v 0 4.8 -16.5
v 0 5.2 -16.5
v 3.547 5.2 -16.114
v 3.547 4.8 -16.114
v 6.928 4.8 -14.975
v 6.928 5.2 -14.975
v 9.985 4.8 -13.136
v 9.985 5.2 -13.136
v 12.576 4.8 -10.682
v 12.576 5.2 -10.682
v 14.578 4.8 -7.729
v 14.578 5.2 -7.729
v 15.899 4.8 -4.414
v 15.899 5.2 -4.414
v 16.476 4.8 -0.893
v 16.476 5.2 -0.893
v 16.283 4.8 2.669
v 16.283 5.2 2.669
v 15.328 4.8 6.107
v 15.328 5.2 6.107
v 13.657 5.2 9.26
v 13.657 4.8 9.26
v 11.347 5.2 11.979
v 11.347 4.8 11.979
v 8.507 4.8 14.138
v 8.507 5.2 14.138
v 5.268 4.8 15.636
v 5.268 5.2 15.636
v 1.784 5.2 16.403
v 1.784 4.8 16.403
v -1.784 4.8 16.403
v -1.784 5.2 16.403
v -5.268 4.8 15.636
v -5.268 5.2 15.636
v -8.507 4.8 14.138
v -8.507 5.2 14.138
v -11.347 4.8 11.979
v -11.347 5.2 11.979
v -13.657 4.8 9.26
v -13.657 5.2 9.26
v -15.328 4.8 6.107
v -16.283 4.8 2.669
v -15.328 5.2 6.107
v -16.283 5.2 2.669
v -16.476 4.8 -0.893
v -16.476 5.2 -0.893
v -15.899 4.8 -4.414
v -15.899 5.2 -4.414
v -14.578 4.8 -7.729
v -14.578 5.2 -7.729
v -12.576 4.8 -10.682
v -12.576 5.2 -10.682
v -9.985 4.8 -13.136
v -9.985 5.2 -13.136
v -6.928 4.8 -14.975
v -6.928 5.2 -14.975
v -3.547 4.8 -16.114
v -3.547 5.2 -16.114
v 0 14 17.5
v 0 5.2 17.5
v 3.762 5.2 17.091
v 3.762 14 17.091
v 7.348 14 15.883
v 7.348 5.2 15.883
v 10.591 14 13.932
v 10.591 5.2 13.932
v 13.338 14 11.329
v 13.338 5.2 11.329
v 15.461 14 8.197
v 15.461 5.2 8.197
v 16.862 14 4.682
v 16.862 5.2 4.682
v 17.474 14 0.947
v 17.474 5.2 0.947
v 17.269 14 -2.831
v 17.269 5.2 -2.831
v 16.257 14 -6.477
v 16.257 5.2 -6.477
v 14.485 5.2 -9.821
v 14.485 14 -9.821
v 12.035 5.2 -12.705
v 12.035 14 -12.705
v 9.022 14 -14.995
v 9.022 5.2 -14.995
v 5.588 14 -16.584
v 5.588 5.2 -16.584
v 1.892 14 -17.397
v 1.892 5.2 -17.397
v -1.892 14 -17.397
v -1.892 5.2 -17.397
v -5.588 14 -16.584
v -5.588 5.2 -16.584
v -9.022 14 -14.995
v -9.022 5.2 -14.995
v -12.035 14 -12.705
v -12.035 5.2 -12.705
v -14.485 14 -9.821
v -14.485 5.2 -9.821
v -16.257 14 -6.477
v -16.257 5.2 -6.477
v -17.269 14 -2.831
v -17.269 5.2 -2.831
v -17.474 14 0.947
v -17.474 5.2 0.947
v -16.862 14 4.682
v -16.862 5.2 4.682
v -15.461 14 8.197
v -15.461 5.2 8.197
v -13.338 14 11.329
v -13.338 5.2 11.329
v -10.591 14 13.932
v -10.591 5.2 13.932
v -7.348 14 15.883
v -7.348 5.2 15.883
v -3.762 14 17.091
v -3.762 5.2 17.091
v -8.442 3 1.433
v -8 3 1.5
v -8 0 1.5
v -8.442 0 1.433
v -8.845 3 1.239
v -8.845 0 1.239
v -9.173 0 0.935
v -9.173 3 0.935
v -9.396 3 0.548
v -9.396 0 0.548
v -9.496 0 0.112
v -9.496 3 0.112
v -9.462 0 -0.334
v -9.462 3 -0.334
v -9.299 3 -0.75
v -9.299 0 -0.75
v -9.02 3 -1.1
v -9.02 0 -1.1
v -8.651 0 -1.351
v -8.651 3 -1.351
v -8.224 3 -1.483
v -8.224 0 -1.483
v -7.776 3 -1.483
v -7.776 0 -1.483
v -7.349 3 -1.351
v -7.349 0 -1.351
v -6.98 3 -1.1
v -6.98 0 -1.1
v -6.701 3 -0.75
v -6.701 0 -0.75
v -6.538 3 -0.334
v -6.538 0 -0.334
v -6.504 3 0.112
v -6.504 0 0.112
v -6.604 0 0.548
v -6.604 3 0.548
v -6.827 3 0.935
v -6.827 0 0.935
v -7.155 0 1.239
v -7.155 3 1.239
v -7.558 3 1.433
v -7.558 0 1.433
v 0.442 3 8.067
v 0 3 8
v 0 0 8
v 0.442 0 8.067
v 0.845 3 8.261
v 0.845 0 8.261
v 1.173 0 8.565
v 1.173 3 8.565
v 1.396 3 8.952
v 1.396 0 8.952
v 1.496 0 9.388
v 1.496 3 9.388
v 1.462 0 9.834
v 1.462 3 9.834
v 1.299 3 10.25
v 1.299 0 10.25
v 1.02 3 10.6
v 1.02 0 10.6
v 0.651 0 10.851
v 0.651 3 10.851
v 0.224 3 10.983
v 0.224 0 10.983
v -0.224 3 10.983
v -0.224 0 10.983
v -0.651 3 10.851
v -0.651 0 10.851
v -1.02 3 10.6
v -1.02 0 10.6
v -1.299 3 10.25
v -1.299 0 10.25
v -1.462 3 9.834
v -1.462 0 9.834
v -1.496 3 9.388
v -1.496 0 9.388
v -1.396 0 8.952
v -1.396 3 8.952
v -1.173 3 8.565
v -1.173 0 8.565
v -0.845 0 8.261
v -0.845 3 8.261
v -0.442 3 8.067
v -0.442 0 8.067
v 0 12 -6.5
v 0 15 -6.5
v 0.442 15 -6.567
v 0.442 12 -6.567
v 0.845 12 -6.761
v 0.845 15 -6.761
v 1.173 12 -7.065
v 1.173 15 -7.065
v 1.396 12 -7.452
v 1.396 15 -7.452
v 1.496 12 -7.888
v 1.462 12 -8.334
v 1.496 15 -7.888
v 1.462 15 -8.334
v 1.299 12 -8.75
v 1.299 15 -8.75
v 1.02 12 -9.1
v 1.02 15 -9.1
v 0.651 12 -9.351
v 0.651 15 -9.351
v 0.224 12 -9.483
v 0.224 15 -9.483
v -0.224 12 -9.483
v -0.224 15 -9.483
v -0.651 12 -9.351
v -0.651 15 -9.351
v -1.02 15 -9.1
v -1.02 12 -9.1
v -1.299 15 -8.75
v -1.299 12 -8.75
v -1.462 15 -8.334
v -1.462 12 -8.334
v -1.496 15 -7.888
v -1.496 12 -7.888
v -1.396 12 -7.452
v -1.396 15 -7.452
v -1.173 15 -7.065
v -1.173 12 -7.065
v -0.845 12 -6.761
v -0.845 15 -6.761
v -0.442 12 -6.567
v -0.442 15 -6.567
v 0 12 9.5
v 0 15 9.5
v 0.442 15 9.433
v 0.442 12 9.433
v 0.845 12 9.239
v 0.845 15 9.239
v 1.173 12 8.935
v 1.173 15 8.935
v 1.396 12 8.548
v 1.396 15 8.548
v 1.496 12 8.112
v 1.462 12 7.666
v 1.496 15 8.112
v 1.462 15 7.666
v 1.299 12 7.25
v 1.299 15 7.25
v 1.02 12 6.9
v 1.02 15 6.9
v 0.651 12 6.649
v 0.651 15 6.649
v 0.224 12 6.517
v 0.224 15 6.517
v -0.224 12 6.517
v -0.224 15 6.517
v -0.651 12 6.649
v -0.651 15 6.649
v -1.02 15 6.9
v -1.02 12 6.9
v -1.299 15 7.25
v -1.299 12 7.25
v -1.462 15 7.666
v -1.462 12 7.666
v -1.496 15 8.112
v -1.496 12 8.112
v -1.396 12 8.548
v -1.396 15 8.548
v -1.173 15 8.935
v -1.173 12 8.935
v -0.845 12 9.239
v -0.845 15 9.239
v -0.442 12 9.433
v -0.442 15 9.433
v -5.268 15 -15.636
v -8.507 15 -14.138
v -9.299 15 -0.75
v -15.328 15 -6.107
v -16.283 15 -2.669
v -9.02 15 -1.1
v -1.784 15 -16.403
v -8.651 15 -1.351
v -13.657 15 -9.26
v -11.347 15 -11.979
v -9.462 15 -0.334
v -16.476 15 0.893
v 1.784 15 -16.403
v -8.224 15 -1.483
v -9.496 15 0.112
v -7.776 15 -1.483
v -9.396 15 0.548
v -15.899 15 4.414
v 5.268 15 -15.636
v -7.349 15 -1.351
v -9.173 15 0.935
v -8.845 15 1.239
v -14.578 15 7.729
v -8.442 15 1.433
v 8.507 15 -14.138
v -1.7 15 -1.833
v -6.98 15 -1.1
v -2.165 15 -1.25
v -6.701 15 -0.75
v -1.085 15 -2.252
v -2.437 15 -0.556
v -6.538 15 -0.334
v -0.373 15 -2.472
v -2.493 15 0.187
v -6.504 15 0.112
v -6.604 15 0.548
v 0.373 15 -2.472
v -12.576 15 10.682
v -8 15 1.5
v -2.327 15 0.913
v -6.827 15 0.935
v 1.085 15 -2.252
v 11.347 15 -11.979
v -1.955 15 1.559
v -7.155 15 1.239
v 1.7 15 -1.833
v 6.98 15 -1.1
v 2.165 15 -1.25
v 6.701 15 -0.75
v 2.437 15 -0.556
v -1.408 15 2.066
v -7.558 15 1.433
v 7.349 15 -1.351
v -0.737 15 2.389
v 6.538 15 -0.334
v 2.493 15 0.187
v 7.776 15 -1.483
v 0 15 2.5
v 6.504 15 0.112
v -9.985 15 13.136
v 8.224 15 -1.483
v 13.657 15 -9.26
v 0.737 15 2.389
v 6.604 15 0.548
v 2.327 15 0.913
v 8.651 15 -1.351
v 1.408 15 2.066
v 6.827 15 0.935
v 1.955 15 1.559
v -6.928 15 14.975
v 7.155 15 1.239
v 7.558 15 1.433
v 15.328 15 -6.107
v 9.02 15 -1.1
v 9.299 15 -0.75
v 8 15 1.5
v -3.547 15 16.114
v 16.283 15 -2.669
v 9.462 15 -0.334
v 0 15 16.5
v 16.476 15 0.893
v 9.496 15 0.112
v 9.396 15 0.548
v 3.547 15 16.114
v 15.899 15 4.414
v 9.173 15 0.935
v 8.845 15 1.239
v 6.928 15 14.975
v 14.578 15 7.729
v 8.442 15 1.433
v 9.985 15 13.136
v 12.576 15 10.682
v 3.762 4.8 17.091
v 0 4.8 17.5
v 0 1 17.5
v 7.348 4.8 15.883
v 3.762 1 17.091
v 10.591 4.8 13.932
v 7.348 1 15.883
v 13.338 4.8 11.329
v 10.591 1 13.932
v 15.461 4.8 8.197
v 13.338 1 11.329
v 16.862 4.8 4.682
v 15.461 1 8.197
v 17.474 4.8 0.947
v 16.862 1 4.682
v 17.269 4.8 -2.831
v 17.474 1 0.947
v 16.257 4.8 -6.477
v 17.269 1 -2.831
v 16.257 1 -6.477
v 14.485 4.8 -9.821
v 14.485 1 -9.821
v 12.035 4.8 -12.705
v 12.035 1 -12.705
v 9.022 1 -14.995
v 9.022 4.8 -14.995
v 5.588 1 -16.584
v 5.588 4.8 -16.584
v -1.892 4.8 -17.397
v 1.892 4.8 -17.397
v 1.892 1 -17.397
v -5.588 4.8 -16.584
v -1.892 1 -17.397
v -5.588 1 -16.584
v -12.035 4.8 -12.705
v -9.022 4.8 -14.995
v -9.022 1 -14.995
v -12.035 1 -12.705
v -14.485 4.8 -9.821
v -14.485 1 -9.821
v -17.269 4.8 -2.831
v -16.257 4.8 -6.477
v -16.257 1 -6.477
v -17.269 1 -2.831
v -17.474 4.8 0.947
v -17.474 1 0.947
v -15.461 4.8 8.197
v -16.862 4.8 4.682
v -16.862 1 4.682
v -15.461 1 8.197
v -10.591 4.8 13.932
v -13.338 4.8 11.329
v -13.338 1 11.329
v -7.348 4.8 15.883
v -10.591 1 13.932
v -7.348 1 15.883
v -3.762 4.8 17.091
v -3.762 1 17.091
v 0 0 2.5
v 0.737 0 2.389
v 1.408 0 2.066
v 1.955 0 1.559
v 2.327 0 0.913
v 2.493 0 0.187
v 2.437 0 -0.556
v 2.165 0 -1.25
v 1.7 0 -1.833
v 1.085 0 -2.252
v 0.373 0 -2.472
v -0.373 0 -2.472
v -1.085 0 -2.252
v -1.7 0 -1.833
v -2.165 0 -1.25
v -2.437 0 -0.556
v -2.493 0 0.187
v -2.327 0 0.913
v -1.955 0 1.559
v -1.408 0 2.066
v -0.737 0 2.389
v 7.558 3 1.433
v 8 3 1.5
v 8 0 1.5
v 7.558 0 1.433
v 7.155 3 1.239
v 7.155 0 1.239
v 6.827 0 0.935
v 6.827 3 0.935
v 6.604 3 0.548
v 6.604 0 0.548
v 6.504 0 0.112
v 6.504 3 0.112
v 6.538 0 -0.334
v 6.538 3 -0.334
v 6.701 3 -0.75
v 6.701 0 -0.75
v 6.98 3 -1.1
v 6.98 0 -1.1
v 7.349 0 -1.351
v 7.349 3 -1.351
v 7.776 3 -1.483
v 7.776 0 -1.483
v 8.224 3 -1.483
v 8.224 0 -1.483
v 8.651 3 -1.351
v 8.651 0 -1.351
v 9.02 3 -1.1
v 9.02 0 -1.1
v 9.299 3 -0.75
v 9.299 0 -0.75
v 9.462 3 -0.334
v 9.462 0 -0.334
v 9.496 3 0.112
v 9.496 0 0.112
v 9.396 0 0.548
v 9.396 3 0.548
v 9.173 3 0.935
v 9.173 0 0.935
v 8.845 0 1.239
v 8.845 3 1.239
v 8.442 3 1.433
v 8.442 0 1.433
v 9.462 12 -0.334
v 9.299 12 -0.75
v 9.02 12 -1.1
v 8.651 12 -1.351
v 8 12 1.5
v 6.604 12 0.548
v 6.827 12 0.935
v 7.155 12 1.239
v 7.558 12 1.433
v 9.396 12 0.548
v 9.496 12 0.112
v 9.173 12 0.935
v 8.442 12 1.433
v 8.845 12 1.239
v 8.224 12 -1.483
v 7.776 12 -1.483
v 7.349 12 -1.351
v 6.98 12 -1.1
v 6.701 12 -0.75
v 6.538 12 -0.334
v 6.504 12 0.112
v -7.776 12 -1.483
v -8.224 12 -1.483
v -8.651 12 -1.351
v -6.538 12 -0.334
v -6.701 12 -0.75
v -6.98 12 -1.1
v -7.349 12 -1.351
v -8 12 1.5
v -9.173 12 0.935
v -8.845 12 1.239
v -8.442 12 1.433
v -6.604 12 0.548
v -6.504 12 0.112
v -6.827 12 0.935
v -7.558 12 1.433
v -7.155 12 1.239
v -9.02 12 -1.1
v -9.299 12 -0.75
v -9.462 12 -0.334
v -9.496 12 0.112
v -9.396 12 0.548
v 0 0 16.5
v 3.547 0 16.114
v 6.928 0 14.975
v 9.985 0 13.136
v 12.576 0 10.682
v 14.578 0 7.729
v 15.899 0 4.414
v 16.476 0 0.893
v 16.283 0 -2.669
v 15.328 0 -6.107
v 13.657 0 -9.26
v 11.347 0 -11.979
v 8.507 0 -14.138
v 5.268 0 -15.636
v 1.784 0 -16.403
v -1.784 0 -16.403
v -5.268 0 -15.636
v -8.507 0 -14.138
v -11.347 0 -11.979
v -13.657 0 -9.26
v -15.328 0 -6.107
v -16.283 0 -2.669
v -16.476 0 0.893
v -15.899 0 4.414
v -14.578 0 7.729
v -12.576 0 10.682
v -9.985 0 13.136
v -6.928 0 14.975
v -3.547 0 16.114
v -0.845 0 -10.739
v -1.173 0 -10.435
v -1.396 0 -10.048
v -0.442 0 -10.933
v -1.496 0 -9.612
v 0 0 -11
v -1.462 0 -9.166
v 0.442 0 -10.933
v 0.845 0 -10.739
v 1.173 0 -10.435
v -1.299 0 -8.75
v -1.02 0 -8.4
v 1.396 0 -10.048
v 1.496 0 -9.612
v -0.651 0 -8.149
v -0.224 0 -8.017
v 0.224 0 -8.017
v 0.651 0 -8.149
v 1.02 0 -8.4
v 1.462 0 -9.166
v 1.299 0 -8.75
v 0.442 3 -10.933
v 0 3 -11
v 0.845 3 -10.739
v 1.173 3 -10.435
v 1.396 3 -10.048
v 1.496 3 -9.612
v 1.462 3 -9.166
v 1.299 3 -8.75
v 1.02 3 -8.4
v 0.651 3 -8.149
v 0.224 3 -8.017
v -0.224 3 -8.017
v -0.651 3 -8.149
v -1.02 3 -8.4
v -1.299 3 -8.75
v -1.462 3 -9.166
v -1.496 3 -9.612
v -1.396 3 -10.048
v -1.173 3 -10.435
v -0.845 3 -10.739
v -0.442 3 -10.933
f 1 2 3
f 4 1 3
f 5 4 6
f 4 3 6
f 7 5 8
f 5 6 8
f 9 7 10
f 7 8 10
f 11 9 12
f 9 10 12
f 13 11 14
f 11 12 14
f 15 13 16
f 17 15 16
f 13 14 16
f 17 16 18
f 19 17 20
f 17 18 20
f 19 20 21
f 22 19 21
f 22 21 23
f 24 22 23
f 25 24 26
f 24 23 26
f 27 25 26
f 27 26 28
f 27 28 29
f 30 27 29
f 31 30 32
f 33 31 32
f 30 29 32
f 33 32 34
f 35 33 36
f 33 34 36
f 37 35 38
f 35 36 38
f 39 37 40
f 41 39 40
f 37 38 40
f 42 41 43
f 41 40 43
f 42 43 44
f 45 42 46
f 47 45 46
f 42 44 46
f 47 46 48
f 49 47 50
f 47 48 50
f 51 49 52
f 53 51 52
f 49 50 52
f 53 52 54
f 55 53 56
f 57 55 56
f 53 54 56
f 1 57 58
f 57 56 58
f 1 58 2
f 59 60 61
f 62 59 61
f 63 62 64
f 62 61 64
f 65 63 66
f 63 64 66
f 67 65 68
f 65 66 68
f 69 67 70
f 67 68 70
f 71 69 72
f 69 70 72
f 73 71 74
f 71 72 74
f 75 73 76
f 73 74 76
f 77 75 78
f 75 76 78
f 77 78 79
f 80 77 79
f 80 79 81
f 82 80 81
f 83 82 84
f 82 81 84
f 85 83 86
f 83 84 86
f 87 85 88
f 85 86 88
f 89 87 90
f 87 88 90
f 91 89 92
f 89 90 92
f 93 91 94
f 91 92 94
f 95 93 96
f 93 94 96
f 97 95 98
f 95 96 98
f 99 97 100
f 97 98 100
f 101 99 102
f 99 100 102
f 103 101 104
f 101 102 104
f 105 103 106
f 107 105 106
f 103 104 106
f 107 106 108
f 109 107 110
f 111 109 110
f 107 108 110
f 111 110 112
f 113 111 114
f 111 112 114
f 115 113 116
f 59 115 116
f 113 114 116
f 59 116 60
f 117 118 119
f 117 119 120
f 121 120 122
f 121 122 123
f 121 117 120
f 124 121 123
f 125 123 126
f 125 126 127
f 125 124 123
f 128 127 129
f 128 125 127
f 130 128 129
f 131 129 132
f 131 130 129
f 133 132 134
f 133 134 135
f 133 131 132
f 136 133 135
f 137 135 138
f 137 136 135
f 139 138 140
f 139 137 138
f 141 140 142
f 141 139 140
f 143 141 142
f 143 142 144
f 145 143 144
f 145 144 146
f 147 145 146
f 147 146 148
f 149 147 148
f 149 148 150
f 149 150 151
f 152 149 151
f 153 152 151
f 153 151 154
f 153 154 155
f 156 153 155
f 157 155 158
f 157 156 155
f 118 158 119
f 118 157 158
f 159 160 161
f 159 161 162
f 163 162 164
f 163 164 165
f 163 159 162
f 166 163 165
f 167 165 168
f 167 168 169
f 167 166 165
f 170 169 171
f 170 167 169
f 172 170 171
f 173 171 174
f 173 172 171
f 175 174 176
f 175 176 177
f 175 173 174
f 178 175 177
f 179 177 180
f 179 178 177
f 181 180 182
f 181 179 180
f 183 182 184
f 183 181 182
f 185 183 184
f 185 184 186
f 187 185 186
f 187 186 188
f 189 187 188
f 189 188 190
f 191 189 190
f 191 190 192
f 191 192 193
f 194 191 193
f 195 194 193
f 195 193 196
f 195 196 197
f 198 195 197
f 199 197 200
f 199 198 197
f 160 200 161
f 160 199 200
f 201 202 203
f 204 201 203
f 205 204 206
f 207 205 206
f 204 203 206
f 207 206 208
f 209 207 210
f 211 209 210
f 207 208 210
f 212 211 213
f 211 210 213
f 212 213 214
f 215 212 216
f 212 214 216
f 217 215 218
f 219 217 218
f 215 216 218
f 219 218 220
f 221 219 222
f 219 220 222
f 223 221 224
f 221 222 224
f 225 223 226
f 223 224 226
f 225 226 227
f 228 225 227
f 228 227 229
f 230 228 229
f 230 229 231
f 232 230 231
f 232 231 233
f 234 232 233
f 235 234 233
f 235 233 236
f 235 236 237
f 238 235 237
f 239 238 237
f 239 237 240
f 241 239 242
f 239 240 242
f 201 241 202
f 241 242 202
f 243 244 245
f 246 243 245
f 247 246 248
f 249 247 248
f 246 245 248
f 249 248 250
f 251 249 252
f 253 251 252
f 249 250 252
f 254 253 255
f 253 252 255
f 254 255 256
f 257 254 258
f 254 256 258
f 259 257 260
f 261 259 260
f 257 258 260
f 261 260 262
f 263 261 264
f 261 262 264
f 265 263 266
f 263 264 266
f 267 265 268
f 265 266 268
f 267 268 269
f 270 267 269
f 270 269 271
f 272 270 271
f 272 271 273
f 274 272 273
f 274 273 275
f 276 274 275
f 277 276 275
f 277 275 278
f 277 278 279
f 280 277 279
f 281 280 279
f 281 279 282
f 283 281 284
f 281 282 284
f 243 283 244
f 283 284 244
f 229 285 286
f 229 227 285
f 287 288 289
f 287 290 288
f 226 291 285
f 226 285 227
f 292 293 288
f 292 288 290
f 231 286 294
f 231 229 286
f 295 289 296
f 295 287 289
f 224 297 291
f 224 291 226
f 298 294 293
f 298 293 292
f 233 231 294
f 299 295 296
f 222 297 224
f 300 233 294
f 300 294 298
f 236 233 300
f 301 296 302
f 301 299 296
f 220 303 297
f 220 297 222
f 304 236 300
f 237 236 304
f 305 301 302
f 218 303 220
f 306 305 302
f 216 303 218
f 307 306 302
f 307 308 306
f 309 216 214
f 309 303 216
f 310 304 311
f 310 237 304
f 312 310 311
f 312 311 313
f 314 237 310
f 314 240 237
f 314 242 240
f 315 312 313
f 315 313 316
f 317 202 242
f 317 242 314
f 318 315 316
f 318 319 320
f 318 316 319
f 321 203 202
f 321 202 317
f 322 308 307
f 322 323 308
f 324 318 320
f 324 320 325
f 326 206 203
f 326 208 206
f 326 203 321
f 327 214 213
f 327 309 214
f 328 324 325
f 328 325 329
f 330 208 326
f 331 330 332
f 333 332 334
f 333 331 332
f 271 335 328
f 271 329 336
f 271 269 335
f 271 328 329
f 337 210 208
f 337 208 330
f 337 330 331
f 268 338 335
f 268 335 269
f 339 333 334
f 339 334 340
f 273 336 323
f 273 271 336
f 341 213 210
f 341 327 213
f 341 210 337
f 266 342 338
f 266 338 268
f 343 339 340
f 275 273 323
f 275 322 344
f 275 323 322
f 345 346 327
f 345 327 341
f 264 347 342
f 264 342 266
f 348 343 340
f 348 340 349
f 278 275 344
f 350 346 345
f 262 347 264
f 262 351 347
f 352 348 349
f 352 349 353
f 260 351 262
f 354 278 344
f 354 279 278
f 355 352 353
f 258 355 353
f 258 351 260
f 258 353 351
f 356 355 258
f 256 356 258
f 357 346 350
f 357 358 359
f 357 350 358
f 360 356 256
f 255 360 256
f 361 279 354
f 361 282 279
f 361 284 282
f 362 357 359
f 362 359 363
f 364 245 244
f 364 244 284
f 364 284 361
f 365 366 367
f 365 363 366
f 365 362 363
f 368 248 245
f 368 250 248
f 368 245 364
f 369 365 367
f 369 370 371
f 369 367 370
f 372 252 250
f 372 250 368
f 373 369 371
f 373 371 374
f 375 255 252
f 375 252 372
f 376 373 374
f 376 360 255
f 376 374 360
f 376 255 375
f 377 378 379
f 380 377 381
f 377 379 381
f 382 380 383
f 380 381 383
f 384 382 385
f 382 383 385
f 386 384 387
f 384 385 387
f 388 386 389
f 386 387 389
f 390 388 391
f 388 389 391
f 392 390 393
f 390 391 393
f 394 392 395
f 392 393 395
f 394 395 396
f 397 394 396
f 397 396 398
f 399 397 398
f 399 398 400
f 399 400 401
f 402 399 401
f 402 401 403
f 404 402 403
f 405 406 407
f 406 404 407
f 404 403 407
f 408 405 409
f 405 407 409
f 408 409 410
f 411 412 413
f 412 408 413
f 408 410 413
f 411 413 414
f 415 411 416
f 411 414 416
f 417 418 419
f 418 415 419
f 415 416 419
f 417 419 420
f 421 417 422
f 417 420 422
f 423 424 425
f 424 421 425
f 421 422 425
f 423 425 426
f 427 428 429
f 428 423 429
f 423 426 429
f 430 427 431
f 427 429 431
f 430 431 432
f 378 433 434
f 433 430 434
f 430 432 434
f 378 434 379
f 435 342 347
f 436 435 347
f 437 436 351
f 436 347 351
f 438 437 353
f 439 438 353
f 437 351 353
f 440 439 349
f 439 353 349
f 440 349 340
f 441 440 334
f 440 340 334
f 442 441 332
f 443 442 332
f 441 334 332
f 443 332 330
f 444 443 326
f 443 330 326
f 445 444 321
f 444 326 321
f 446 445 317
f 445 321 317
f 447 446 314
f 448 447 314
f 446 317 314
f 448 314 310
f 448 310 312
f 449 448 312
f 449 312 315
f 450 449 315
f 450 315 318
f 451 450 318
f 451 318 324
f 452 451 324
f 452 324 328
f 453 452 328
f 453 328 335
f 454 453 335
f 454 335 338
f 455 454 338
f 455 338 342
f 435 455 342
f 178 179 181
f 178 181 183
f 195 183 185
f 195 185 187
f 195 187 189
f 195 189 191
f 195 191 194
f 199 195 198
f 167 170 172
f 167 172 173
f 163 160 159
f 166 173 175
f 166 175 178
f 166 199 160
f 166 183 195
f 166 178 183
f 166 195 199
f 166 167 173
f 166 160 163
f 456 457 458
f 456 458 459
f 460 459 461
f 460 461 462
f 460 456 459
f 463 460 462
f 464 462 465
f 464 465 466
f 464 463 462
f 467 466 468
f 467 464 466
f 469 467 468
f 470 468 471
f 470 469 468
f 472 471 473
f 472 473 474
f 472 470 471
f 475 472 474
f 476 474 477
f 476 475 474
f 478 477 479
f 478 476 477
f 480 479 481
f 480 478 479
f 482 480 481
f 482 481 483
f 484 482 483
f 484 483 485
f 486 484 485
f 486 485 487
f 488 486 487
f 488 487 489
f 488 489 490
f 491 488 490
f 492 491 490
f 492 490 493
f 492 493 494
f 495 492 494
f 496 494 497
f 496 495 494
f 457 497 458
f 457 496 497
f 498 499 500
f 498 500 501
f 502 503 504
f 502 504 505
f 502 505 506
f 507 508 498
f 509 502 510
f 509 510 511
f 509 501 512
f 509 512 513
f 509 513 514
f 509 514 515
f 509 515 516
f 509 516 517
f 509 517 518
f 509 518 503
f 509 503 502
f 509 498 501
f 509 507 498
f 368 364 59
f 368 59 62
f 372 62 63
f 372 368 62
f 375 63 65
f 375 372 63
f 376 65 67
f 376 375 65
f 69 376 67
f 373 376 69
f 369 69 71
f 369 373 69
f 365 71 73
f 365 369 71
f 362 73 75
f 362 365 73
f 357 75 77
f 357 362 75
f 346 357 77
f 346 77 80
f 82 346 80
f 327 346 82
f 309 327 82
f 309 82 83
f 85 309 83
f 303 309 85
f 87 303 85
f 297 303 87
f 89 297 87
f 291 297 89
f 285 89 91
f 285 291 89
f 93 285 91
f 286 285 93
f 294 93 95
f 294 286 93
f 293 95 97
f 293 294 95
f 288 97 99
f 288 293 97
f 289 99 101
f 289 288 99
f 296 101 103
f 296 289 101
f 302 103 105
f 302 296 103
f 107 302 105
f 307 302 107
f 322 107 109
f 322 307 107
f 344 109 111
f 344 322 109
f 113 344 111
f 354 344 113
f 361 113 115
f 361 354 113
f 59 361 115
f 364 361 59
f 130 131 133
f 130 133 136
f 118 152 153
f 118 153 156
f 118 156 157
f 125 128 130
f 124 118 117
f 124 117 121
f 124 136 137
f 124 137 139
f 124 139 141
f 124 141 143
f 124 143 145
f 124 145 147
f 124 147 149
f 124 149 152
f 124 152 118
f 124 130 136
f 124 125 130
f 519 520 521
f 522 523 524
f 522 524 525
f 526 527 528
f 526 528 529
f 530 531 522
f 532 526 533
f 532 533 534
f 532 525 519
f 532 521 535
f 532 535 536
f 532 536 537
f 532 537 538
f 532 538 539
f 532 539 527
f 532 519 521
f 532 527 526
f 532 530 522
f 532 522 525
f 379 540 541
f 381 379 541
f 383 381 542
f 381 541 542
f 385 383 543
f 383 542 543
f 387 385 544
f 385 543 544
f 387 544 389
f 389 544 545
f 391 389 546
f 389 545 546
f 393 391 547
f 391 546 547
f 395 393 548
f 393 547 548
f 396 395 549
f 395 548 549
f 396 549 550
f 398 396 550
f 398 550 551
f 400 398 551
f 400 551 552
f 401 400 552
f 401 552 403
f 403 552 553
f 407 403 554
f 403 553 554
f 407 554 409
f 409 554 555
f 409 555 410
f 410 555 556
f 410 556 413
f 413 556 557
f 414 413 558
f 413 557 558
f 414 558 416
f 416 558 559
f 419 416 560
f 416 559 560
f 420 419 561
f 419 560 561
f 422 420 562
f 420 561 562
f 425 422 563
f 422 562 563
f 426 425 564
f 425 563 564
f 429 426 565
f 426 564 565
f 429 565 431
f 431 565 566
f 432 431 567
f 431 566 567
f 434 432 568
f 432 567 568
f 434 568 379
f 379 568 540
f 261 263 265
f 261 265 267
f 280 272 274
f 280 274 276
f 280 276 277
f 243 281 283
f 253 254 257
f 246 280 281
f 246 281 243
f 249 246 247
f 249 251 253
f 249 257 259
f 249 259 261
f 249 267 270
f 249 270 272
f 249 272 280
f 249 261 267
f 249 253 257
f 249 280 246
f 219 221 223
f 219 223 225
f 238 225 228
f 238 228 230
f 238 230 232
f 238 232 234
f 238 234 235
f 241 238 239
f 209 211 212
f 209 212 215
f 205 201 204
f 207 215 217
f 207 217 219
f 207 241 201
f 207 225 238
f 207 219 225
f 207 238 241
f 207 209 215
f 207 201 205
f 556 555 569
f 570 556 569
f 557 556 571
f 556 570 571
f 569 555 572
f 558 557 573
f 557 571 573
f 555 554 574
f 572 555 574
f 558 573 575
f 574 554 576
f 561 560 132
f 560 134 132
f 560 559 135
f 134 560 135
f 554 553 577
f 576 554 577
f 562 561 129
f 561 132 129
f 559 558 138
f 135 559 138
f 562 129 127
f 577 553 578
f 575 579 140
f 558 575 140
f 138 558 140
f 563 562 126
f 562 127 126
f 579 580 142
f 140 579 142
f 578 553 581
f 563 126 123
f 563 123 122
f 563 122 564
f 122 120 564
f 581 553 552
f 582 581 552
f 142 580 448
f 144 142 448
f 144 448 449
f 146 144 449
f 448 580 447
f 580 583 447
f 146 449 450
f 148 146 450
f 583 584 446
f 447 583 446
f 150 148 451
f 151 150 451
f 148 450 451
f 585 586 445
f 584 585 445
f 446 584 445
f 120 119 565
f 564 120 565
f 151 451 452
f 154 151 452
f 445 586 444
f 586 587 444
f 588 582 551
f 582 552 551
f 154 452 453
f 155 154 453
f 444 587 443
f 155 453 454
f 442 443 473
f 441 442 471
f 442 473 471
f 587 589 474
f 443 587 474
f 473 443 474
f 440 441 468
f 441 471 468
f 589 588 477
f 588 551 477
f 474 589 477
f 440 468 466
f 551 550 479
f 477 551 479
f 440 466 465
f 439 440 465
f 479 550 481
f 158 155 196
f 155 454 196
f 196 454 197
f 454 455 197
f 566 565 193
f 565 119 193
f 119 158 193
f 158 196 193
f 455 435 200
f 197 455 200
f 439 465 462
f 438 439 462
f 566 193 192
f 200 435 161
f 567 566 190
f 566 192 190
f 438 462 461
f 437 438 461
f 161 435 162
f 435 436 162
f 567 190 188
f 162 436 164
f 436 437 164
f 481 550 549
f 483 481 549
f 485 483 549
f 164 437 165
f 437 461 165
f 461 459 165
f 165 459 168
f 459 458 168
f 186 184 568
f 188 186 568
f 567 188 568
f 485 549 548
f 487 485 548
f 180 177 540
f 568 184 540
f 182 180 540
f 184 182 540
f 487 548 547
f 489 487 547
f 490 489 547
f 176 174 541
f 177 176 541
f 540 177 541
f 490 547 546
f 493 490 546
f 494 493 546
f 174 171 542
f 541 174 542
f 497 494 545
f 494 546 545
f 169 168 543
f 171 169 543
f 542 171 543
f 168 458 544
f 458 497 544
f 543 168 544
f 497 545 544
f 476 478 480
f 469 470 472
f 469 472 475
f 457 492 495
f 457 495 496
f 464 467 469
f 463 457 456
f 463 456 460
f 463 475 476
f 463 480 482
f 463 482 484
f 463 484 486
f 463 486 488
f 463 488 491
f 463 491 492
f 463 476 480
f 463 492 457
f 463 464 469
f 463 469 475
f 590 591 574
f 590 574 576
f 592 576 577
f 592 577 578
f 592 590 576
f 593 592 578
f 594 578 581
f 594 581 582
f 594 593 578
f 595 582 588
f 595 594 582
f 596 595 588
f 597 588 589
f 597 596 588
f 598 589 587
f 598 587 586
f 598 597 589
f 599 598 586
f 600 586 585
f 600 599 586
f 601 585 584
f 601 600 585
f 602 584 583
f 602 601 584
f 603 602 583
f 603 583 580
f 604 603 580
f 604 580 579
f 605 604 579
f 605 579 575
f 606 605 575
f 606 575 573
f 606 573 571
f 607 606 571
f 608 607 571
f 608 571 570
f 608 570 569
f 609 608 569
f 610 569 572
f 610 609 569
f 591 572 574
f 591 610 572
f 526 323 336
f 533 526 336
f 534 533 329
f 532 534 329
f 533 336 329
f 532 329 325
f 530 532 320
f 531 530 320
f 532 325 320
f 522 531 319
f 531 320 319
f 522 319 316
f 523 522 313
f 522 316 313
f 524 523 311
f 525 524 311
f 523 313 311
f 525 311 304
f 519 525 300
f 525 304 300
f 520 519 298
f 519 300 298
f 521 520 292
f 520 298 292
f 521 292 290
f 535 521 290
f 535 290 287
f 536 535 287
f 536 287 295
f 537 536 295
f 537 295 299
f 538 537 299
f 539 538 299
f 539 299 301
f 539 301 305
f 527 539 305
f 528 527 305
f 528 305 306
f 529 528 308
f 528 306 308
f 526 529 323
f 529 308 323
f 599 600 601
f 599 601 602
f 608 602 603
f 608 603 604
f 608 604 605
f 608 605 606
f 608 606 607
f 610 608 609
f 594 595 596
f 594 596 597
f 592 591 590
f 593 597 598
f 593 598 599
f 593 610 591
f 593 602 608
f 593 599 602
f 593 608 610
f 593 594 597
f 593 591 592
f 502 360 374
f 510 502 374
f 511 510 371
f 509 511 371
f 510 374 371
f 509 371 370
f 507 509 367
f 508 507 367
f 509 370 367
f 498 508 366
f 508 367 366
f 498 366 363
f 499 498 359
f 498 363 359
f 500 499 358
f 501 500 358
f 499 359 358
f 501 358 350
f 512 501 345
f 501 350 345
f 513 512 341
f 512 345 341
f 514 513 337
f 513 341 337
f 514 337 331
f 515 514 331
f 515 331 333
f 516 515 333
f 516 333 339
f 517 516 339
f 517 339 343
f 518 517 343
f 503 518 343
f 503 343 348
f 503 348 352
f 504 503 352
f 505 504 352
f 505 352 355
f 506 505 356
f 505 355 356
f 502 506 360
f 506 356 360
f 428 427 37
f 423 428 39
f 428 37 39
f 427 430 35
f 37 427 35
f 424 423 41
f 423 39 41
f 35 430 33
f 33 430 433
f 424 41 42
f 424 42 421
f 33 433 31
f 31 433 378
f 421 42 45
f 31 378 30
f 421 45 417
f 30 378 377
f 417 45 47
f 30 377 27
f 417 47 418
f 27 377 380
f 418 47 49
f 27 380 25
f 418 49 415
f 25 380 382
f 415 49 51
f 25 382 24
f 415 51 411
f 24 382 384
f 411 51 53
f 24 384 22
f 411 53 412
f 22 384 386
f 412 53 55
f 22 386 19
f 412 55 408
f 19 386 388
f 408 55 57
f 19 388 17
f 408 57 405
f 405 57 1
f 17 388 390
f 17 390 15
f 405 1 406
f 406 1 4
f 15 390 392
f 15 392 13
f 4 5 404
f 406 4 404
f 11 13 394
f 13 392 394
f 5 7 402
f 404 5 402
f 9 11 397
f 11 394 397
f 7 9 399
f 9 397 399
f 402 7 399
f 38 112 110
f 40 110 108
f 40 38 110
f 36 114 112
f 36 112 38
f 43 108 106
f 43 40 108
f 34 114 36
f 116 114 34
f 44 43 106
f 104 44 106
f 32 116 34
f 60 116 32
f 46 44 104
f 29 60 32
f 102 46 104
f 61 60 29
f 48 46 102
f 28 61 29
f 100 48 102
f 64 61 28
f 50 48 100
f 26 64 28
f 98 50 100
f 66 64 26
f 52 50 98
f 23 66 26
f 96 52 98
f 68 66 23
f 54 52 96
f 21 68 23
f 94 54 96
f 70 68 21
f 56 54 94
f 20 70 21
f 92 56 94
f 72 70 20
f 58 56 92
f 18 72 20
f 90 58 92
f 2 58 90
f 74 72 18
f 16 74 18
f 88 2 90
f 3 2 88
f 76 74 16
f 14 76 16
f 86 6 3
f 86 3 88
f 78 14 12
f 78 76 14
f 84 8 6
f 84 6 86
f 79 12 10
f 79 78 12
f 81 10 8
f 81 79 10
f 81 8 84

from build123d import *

# Parameters (mm, degrees)
SKETCH1_R               = 17.5
BOSS_EXTRUDE1_DEPTH     = 15
SKETCH2_R               = 1.5
CUT_EXTRUDE1_DEPTH      = 3
CUT_EXTRUDE2_START      = -3
SKETCH3_R               = 1.5
CUT_EXTRUDE2_DEPTH      = 3
CUT_EXTRUDE3_DEPTH      = 0.2
CUT_EXTRUDE3_DEPTH_BACK = 0.2
SKETCH4_R               = 17.5
SKETCH4_R_2             = 16.5
CHAMFER1_SIZE           = 1
SKETCH5_R               = 2.5
CUT_EXTRUDE4_DEPTH      = 29.939592257


with BuildPart() as part:
    # Sketch1 → Boss-Extrude1 (new body)
    with BuildSketch(Plane(origin=(0, 0, 0), x_dir=(1, 0, 0), z_dir=(0, 1, 0))):
        with Locations(Location((0, 0, 0), (0, 0, 270))):
            Circle(SKETCH1_R)
    extrude(amount=BOSS_EXTRUDE1_DEPTH)

    # Sketch2 → Cut-Extrude1 (cut)
    with BuildSketch(Plane(origin=(0, 15, 0), x_dir=(1, 0, 0), z_dir=(0, 1, 0))):
        with Locations(Location((-8, 0, 0), (0, 0, 270))):
            Circle(SKETCH2_R)
        with Locations(Location((8, 0, 0), (0, 0, 270))):
            Circle(SKETCH2_R)
        with Locations(Location((0, 8, 0), (0, 0, 270))):
            Circle(SKETCH2_R)
        with Locations(Location((0, -8, 0), (0, 0, 270))):
            Circle(SKETCH2_R)
    extrude(amount=-CUT_EXTRUDE1_DEPTH, mode=Mode.SUBTRACT)

    # Sketch3 → Cut-Extrude2 (cut)
    with BuildSketch(Plane.XZ.offset(CUT_EXTRUDE2_START)):
        with Locations(Location((0, 9.5, 0), (0, 0, 270))):
            Circle(SKETCH3_R)
        with Locations(Location((0, -9.5, 0), (0, 0, 270))):
            Circle(SKETCH3_R)
        with Locations(Location((8, 0, 0), (0, 0, 90))):
            Circle(SKETCH3_R)
        with Locations(Location((-8, 0, 0), (0, 0, 90))):
            Circle(SKETCH3_R)
    extrude(amount=CUT_EXTRUDE2_DEPTH, mode=Mode.SUBTRACT)

    # Sketch4 → Cut-Extrude3 (cut, two sides: drawn at the far end of the back side and taken through both)
    with BuildSketch(Plane(origin=(0, 5, 0), x_dir=(-1, 0, 0), z_dir=(0, -1, 0)).offset(-CUT_EXTRUDE3_DEPTH_BACK)):
        with Locations(Location((0, 0, 0), (0, 0, 90))):
            Circle(SKETCH4_R)
        with Locations(Location((0, 0, 0), (0, 0, 90))):
            Circle(SKETCH4_R_2, mode=Mode.SUBTRACT)
    extrude(amount=CUT_EXTRUDE3_DEPTH + CUT_EXTRUDE3_DEPTH_BACK, mode=Mode.SUBTRACT)

    # Chamfer1
    chamfer1_edges = [part.edges().sort_by_distance(p)[0] for p in [
        (0, 0, -17.5),
        (0, 15, -17.5),
    ]]
    chamfer(chamfer1_edges, length=CHAMFER1_SIZE)

    # Sketch5 → Cut-Extrude4 (cut, through all)
    with BuildSketch(Plane(origin=(0, 15, 0), x_dir=(1, 0, 0), z_dir=(0, 1, 0))):
        with Locations(Location((0, 0, 0), (0, 0, 270))):
            Circle(SKETCH5_R)
    extrude(amount=-CUT_EXTRUDE4_DEPTH, mode=Mode.SUBTRACT)


solid = part.part
